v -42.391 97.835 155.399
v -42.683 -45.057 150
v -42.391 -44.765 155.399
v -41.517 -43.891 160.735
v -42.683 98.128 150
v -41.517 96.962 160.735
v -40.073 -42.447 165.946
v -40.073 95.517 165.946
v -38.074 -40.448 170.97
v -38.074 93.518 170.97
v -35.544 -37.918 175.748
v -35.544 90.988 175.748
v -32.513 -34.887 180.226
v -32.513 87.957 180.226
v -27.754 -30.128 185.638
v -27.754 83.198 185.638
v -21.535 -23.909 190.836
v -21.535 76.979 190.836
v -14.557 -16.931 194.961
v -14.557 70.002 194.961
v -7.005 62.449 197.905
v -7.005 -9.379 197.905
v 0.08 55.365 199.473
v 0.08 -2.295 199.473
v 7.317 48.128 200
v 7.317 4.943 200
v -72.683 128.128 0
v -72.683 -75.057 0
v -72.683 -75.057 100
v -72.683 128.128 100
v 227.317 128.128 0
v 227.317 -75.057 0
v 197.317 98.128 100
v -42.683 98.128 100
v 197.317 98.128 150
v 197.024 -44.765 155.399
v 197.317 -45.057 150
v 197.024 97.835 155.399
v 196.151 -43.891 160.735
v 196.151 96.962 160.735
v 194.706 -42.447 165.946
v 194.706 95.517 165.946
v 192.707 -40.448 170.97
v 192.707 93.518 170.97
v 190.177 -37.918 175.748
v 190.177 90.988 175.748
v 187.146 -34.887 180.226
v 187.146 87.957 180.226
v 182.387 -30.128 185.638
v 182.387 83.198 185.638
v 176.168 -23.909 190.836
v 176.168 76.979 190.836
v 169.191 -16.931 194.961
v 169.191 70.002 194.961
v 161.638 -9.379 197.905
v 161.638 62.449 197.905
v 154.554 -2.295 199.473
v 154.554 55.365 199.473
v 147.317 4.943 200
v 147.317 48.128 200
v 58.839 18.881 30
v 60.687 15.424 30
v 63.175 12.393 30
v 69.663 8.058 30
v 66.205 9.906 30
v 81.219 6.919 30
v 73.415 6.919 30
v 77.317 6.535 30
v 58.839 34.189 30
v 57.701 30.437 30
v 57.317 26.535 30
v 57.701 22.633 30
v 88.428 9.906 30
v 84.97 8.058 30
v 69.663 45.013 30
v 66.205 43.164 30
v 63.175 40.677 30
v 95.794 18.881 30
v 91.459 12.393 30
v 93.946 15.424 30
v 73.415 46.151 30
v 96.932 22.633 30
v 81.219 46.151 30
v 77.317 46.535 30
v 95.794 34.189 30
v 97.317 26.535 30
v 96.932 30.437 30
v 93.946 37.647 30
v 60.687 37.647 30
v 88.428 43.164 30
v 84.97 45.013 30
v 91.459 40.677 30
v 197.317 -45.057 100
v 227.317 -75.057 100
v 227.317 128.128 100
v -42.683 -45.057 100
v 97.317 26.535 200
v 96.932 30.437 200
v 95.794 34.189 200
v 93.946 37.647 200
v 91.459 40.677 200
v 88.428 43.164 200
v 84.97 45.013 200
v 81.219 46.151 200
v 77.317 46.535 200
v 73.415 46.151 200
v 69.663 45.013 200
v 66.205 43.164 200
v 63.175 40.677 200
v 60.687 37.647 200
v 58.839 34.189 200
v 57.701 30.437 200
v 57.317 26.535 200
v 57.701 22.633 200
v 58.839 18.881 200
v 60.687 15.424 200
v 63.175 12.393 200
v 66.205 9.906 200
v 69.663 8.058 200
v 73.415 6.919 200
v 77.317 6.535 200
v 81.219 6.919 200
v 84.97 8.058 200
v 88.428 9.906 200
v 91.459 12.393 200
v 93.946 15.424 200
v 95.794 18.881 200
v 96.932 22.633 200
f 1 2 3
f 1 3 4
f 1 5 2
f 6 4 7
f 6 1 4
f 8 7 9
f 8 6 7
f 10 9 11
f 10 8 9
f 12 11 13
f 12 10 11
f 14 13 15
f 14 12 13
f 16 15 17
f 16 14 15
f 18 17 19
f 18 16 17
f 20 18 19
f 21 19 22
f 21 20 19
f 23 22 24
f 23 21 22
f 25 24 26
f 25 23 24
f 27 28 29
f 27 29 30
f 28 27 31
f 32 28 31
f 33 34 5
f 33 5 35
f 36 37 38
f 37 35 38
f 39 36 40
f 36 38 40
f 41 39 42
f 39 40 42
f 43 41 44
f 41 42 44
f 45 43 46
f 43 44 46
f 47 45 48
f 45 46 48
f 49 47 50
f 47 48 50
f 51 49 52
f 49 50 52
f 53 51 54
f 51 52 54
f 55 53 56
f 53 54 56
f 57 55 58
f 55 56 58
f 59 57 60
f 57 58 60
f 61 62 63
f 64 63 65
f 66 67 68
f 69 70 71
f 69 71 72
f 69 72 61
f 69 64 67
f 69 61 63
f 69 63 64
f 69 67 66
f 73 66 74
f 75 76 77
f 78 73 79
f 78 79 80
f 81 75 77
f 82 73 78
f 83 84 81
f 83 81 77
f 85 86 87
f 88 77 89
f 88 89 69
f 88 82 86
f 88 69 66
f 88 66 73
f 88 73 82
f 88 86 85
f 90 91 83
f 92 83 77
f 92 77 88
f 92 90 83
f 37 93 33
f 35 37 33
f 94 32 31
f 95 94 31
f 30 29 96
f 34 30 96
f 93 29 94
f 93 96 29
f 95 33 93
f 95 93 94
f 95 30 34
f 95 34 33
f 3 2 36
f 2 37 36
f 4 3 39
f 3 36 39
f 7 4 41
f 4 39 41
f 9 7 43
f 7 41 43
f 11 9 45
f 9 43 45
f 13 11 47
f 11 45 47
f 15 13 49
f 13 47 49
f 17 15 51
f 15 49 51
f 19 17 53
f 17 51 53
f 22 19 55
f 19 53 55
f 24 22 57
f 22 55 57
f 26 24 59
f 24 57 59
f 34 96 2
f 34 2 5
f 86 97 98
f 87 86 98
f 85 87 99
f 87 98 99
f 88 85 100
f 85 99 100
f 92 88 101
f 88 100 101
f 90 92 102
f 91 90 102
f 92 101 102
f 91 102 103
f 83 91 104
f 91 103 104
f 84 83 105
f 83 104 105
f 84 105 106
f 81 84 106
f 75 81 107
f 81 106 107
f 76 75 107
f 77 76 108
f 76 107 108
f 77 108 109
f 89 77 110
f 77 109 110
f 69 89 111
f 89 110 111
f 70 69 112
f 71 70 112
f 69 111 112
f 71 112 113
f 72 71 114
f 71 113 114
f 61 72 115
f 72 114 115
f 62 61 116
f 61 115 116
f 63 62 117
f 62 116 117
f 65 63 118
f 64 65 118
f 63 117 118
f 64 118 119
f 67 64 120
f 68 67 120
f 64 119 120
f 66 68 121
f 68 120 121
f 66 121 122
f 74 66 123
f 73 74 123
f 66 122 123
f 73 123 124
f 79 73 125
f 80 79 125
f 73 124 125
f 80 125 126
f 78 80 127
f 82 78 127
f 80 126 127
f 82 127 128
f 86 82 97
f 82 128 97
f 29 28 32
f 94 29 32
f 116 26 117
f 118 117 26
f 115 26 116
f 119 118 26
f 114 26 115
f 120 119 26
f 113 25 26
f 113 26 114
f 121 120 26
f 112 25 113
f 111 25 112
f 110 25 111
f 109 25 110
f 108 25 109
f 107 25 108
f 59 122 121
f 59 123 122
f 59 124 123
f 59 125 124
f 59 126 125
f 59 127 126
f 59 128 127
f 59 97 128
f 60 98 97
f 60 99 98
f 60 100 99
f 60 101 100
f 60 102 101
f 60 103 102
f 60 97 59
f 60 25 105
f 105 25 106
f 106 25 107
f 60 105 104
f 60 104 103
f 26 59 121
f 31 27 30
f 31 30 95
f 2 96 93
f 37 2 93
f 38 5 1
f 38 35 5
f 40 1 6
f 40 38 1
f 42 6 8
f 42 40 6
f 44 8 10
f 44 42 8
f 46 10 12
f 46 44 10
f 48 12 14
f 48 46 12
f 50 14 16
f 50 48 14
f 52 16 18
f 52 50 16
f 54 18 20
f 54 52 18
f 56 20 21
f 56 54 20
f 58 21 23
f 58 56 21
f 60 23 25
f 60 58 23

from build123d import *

# Parameters (mm, degrees)
F0_W     = 300
F0_H     = 203.185
F1_DEPTH = 100
F2_W     = 240
F2_H     = 143.185
F3_DEPTH = 100
F4_R     = 50
F5_R     = 20
F6_DEPTH = 170


with BuildPart() as f1:
    # F0 (on Top) → F1 (new body)
    with BuildSketch(Plane.XY):
        with Locations((77.316695, 26.535105)):
            Rectangle(F0_W, F0_H)
    extrude(amount=F1_DEPTH)

    # F2 (on face) → F3 (join)
    with BuildSketch(Plane.XY.offset(100)):
        with Locations((77.316695, 26.535105)):
            Rectangle(F2_W, F2_H)
    extrude(amount=F3_DEPTH)

    # F4
    f4_edges = [f1.edges().sort_by_distance(p)[0] for p in [
        (77.316695, 98.127605, 200),
        (-42.683305, 26.535105, 200),
        (77.316695, -45.057395, 200),
        (197.316695, 26.535105, 200),
    ]]
    fillet(f4_edges, radius=F4_R)

    # F5 (on face) → F6 (cut)
    with BuildSketch(Plane.XY.offset(200)):
        with Locations((77.316695, 26.535105)):
            Circle(F5_R)
    extrude(amount=-F6_DEPTH, mode=Mode.SUBTRACT)


solid = f1.part
